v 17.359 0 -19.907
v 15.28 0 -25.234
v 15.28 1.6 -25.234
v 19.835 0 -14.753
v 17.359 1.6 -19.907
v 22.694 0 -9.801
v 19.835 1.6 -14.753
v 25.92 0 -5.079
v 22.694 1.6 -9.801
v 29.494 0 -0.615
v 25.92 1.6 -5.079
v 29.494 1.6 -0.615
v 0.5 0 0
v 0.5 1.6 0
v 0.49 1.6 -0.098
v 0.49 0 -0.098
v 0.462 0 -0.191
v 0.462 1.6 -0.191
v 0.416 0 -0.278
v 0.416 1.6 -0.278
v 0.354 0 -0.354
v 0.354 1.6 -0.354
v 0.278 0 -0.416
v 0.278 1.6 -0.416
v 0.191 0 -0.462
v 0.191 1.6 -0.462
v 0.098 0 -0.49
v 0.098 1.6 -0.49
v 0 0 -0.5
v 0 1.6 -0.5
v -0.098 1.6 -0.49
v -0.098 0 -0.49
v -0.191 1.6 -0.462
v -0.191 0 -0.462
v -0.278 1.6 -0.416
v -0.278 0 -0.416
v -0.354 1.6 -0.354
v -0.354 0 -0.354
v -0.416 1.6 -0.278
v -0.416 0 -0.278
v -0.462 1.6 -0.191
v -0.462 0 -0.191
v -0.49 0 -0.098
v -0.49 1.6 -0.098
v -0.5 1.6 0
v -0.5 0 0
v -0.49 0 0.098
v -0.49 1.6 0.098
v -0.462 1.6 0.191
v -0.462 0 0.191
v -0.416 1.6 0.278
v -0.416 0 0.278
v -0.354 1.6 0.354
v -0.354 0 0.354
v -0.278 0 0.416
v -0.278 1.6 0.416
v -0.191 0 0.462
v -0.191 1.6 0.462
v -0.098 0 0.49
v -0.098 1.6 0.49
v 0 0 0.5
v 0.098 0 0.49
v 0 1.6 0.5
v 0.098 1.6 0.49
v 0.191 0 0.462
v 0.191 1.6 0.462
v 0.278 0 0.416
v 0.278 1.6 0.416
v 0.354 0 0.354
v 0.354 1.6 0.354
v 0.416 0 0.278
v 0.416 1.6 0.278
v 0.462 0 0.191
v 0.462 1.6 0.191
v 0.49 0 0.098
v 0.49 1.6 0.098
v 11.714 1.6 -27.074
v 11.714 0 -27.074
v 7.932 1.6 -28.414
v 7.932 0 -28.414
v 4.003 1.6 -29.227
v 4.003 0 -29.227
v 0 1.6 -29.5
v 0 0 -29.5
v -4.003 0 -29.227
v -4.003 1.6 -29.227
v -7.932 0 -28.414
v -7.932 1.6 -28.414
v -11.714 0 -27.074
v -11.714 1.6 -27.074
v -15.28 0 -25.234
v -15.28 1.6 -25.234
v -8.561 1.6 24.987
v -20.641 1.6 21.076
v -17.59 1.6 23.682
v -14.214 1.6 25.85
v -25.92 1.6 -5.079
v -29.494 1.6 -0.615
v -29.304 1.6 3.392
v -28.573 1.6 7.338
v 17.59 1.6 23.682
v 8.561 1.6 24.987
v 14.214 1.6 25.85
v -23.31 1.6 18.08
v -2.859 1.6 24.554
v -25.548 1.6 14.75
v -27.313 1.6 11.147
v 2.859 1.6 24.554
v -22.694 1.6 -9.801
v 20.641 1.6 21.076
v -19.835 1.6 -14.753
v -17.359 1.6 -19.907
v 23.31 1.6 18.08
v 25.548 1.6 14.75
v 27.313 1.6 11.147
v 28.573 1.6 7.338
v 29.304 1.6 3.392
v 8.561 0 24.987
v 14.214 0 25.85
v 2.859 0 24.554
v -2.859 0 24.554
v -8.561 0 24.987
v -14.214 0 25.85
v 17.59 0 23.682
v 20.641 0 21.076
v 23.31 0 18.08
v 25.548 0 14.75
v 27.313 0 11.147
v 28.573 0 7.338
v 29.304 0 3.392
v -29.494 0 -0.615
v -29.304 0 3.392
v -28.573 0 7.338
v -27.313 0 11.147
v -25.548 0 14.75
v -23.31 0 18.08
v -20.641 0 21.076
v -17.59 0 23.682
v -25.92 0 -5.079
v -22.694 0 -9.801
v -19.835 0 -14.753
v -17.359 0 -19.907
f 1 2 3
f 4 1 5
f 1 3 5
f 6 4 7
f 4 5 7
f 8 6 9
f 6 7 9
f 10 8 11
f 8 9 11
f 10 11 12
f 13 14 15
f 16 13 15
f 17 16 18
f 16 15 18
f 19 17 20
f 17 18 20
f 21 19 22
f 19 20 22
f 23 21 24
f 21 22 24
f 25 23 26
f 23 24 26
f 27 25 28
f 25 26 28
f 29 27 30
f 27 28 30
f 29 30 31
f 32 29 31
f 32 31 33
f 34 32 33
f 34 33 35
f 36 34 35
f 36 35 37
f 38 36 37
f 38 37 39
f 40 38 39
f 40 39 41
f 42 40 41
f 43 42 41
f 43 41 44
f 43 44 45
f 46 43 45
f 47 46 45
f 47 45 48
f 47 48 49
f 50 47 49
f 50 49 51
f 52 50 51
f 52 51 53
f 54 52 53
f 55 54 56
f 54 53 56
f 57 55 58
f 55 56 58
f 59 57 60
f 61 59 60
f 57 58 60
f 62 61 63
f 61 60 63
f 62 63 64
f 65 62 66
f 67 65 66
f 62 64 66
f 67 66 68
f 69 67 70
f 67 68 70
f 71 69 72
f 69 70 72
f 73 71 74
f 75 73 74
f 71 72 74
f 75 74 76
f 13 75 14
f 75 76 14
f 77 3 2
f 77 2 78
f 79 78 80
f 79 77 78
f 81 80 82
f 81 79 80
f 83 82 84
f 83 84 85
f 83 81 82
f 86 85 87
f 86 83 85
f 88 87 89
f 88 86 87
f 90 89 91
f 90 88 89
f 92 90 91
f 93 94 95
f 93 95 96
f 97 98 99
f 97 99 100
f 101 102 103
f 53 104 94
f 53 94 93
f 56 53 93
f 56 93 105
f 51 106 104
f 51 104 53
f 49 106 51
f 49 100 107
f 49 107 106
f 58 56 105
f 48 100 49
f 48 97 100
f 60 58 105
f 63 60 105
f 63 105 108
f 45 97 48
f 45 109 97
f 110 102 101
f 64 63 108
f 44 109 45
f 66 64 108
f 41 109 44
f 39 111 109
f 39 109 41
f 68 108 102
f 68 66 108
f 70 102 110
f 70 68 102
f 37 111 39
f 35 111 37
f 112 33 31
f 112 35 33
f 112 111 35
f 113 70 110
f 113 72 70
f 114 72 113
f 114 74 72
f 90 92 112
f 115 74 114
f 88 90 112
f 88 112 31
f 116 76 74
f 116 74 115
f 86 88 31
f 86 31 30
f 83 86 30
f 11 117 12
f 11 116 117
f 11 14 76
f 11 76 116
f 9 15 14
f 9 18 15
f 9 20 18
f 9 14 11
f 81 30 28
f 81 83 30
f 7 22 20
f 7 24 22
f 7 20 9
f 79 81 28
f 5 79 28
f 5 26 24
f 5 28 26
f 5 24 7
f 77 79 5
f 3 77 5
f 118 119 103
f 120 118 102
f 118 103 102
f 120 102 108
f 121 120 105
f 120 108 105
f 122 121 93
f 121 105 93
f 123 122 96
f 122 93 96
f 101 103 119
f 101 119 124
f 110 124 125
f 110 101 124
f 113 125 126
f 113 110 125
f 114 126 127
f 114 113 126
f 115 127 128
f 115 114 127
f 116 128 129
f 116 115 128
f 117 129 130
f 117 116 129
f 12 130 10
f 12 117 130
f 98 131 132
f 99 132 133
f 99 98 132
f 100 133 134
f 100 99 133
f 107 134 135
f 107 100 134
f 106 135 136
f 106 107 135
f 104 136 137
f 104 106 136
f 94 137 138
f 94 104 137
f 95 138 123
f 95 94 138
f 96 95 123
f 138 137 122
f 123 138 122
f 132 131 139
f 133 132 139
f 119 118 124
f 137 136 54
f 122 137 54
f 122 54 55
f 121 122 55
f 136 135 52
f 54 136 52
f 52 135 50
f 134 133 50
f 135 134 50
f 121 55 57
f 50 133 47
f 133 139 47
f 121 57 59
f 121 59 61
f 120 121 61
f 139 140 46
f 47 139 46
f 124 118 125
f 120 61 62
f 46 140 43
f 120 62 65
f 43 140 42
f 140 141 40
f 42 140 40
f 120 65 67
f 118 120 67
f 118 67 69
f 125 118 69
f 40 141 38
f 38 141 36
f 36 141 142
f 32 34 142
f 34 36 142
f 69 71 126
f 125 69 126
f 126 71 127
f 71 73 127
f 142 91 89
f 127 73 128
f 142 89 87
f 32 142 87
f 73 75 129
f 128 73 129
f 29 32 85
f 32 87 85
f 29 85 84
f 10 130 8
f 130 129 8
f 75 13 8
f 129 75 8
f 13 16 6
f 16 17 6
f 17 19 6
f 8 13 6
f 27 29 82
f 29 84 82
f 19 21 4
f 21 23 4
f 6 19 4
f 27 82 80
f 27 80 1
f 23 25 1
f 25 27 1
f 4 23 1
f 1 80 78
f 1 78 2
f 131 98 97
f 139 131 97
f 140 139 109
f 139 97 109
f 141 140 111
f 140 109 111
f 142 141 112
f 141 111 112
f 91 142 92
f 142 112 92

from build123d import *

# Parameters (mm, degrees)
SKETCH1_R           = 37
BOSS_EXTRUDE1_DEPTH = 1.6
SKETCH5_R           = 75.500139874
CUT_EXTRUDE2_DEPTH  = 2.6
SKETCH7_R           = 0.5
CUT_EXTRUDE3_DEPTH  = 2.6
SKETCH3_R           = 1.75
CUT_EXTRUDE4_DEPTH  = 2.6
SKETCH8_R           = 1.65
CUT_EXTRUDE5_DEPTH  = 2.6
CIRPATTERN2_COUNT   = 3
SKETCH10_OUTSIDE_W  = 94.454
SKETCH10_OUTSIDE_H  = 86.922
SKETCH10_OUTSIDE_R  = 29.5
CUT_EXTRUDE7_DEPTH  = 10


with BuildPart() as part:
    # Sketch1 → Boss-Extrude1 (new body)
    with BuildSketch(Plane(origin=(0, 0, 0), x_dir=(1, 0, 0), z_dir=(0, 1, 0))):
        Circle(SKETCH1_R)
    extrude(amount=BOSS_EXTRUDE1_DEPTH)

    # Sketch5 → Cut-Extrude2 (cut, through all)
    with BuildSketch(Plane(origin=(0, 1.6, 0), x_dir=(1, 0, 0), z_dir=(0, 1, 0))):
        with Locations((86.602540378, 50)):
            Circle(SKETCH5_R)
    cut_extrude2 = extrude(amount=-CUT_EXTRUDE2_DEPTH, mode=Mode.SUBTRACT)

    # Sketch7 → Cut-Extrude3 (cut, through all)
    with BuildSketch(Plane(origin=(0, 1.6, 0), x_dir=(1, 0, 0), z_dir=(0, 1, 0))):
        Circle(SKETCH7_R)
    extrude(amount=-CUT_EXTRUDE3_DEPTH, mode=Mode.SUBTRACT)

    # Sketch3 → Cut-Extrude4 (cut, through all)
    with BuildSketch(Plane(origin=(0, 1.6, 0), x_dir=(1, 0, 0), z_dir=(0, 1, 0))):
        with Locations((2.788983768, 31.878230339)):
            Circle(SKETCH3_R)
        with Locations((26.212865417, -18.354445963)):
            Circle(SKETCH3_R)
        with Locations((-29.001849185, -13.523784376)):
            Circle(SKETCH3_R)
    extrude(amount=-CUT_EXTRUDE4_DEPTH, mode=Mode.SUBTRACT)

    # Sketch8 → Cut-Extrude5 (cut, through all)
    with BuildSketch(Plane(origin=(0, 1.6, 0), x_dir=(1, 0, 0), z_dir=(0, 1, 0))):
        with Locations((-5.904038041, 33.483463602)):
            Circle(SKETCH8_R)
    cut_extrude5 = extrude(amount=-CUT_EXTRUDE5_DEPTH, mode=Mode.SUBTRACT)

    # CirPattern2: Cut-Extrude2, Cut-Extrude5 ×3 about axis
    cirpattern2_axis = Axis((0, 0, 0), (0, 1, 0))
    for i in range(1, CIRPATTERN2_COUNT):
        add(cut_extrude2.rotate(cirpattern2_axis, i * 360 / CIRPATTERN2_COUNT), mode=Mode.SUBTRACT)
        add(cut_extrude5.rotate(cirpattern2_axis, i * 360 / CIRPATTERN2_COUNT), mode=Mode.SUBTRACT)

    # Sketch10 outside → Cut-Extrude7 (cut)
    with BuildSketch(Plane(origin=(0, 1.6, 0), x_dir=(1, 0, 0), z_dir=(0, 1, 0))):
        with Locations((0, 4.328)):
            Rectangle(SKETCH10_OUTSIDE_W, SKETCH10_OUTSIDE_H)
        Circle(SKETCH10_OUTSIDE_R, mode=Mode.SUBTRACT)
    extrude(amount=-CUT_EXTRUDE7_DEPTH, mode=Mode.SUBTRACT)


solid = part.part
